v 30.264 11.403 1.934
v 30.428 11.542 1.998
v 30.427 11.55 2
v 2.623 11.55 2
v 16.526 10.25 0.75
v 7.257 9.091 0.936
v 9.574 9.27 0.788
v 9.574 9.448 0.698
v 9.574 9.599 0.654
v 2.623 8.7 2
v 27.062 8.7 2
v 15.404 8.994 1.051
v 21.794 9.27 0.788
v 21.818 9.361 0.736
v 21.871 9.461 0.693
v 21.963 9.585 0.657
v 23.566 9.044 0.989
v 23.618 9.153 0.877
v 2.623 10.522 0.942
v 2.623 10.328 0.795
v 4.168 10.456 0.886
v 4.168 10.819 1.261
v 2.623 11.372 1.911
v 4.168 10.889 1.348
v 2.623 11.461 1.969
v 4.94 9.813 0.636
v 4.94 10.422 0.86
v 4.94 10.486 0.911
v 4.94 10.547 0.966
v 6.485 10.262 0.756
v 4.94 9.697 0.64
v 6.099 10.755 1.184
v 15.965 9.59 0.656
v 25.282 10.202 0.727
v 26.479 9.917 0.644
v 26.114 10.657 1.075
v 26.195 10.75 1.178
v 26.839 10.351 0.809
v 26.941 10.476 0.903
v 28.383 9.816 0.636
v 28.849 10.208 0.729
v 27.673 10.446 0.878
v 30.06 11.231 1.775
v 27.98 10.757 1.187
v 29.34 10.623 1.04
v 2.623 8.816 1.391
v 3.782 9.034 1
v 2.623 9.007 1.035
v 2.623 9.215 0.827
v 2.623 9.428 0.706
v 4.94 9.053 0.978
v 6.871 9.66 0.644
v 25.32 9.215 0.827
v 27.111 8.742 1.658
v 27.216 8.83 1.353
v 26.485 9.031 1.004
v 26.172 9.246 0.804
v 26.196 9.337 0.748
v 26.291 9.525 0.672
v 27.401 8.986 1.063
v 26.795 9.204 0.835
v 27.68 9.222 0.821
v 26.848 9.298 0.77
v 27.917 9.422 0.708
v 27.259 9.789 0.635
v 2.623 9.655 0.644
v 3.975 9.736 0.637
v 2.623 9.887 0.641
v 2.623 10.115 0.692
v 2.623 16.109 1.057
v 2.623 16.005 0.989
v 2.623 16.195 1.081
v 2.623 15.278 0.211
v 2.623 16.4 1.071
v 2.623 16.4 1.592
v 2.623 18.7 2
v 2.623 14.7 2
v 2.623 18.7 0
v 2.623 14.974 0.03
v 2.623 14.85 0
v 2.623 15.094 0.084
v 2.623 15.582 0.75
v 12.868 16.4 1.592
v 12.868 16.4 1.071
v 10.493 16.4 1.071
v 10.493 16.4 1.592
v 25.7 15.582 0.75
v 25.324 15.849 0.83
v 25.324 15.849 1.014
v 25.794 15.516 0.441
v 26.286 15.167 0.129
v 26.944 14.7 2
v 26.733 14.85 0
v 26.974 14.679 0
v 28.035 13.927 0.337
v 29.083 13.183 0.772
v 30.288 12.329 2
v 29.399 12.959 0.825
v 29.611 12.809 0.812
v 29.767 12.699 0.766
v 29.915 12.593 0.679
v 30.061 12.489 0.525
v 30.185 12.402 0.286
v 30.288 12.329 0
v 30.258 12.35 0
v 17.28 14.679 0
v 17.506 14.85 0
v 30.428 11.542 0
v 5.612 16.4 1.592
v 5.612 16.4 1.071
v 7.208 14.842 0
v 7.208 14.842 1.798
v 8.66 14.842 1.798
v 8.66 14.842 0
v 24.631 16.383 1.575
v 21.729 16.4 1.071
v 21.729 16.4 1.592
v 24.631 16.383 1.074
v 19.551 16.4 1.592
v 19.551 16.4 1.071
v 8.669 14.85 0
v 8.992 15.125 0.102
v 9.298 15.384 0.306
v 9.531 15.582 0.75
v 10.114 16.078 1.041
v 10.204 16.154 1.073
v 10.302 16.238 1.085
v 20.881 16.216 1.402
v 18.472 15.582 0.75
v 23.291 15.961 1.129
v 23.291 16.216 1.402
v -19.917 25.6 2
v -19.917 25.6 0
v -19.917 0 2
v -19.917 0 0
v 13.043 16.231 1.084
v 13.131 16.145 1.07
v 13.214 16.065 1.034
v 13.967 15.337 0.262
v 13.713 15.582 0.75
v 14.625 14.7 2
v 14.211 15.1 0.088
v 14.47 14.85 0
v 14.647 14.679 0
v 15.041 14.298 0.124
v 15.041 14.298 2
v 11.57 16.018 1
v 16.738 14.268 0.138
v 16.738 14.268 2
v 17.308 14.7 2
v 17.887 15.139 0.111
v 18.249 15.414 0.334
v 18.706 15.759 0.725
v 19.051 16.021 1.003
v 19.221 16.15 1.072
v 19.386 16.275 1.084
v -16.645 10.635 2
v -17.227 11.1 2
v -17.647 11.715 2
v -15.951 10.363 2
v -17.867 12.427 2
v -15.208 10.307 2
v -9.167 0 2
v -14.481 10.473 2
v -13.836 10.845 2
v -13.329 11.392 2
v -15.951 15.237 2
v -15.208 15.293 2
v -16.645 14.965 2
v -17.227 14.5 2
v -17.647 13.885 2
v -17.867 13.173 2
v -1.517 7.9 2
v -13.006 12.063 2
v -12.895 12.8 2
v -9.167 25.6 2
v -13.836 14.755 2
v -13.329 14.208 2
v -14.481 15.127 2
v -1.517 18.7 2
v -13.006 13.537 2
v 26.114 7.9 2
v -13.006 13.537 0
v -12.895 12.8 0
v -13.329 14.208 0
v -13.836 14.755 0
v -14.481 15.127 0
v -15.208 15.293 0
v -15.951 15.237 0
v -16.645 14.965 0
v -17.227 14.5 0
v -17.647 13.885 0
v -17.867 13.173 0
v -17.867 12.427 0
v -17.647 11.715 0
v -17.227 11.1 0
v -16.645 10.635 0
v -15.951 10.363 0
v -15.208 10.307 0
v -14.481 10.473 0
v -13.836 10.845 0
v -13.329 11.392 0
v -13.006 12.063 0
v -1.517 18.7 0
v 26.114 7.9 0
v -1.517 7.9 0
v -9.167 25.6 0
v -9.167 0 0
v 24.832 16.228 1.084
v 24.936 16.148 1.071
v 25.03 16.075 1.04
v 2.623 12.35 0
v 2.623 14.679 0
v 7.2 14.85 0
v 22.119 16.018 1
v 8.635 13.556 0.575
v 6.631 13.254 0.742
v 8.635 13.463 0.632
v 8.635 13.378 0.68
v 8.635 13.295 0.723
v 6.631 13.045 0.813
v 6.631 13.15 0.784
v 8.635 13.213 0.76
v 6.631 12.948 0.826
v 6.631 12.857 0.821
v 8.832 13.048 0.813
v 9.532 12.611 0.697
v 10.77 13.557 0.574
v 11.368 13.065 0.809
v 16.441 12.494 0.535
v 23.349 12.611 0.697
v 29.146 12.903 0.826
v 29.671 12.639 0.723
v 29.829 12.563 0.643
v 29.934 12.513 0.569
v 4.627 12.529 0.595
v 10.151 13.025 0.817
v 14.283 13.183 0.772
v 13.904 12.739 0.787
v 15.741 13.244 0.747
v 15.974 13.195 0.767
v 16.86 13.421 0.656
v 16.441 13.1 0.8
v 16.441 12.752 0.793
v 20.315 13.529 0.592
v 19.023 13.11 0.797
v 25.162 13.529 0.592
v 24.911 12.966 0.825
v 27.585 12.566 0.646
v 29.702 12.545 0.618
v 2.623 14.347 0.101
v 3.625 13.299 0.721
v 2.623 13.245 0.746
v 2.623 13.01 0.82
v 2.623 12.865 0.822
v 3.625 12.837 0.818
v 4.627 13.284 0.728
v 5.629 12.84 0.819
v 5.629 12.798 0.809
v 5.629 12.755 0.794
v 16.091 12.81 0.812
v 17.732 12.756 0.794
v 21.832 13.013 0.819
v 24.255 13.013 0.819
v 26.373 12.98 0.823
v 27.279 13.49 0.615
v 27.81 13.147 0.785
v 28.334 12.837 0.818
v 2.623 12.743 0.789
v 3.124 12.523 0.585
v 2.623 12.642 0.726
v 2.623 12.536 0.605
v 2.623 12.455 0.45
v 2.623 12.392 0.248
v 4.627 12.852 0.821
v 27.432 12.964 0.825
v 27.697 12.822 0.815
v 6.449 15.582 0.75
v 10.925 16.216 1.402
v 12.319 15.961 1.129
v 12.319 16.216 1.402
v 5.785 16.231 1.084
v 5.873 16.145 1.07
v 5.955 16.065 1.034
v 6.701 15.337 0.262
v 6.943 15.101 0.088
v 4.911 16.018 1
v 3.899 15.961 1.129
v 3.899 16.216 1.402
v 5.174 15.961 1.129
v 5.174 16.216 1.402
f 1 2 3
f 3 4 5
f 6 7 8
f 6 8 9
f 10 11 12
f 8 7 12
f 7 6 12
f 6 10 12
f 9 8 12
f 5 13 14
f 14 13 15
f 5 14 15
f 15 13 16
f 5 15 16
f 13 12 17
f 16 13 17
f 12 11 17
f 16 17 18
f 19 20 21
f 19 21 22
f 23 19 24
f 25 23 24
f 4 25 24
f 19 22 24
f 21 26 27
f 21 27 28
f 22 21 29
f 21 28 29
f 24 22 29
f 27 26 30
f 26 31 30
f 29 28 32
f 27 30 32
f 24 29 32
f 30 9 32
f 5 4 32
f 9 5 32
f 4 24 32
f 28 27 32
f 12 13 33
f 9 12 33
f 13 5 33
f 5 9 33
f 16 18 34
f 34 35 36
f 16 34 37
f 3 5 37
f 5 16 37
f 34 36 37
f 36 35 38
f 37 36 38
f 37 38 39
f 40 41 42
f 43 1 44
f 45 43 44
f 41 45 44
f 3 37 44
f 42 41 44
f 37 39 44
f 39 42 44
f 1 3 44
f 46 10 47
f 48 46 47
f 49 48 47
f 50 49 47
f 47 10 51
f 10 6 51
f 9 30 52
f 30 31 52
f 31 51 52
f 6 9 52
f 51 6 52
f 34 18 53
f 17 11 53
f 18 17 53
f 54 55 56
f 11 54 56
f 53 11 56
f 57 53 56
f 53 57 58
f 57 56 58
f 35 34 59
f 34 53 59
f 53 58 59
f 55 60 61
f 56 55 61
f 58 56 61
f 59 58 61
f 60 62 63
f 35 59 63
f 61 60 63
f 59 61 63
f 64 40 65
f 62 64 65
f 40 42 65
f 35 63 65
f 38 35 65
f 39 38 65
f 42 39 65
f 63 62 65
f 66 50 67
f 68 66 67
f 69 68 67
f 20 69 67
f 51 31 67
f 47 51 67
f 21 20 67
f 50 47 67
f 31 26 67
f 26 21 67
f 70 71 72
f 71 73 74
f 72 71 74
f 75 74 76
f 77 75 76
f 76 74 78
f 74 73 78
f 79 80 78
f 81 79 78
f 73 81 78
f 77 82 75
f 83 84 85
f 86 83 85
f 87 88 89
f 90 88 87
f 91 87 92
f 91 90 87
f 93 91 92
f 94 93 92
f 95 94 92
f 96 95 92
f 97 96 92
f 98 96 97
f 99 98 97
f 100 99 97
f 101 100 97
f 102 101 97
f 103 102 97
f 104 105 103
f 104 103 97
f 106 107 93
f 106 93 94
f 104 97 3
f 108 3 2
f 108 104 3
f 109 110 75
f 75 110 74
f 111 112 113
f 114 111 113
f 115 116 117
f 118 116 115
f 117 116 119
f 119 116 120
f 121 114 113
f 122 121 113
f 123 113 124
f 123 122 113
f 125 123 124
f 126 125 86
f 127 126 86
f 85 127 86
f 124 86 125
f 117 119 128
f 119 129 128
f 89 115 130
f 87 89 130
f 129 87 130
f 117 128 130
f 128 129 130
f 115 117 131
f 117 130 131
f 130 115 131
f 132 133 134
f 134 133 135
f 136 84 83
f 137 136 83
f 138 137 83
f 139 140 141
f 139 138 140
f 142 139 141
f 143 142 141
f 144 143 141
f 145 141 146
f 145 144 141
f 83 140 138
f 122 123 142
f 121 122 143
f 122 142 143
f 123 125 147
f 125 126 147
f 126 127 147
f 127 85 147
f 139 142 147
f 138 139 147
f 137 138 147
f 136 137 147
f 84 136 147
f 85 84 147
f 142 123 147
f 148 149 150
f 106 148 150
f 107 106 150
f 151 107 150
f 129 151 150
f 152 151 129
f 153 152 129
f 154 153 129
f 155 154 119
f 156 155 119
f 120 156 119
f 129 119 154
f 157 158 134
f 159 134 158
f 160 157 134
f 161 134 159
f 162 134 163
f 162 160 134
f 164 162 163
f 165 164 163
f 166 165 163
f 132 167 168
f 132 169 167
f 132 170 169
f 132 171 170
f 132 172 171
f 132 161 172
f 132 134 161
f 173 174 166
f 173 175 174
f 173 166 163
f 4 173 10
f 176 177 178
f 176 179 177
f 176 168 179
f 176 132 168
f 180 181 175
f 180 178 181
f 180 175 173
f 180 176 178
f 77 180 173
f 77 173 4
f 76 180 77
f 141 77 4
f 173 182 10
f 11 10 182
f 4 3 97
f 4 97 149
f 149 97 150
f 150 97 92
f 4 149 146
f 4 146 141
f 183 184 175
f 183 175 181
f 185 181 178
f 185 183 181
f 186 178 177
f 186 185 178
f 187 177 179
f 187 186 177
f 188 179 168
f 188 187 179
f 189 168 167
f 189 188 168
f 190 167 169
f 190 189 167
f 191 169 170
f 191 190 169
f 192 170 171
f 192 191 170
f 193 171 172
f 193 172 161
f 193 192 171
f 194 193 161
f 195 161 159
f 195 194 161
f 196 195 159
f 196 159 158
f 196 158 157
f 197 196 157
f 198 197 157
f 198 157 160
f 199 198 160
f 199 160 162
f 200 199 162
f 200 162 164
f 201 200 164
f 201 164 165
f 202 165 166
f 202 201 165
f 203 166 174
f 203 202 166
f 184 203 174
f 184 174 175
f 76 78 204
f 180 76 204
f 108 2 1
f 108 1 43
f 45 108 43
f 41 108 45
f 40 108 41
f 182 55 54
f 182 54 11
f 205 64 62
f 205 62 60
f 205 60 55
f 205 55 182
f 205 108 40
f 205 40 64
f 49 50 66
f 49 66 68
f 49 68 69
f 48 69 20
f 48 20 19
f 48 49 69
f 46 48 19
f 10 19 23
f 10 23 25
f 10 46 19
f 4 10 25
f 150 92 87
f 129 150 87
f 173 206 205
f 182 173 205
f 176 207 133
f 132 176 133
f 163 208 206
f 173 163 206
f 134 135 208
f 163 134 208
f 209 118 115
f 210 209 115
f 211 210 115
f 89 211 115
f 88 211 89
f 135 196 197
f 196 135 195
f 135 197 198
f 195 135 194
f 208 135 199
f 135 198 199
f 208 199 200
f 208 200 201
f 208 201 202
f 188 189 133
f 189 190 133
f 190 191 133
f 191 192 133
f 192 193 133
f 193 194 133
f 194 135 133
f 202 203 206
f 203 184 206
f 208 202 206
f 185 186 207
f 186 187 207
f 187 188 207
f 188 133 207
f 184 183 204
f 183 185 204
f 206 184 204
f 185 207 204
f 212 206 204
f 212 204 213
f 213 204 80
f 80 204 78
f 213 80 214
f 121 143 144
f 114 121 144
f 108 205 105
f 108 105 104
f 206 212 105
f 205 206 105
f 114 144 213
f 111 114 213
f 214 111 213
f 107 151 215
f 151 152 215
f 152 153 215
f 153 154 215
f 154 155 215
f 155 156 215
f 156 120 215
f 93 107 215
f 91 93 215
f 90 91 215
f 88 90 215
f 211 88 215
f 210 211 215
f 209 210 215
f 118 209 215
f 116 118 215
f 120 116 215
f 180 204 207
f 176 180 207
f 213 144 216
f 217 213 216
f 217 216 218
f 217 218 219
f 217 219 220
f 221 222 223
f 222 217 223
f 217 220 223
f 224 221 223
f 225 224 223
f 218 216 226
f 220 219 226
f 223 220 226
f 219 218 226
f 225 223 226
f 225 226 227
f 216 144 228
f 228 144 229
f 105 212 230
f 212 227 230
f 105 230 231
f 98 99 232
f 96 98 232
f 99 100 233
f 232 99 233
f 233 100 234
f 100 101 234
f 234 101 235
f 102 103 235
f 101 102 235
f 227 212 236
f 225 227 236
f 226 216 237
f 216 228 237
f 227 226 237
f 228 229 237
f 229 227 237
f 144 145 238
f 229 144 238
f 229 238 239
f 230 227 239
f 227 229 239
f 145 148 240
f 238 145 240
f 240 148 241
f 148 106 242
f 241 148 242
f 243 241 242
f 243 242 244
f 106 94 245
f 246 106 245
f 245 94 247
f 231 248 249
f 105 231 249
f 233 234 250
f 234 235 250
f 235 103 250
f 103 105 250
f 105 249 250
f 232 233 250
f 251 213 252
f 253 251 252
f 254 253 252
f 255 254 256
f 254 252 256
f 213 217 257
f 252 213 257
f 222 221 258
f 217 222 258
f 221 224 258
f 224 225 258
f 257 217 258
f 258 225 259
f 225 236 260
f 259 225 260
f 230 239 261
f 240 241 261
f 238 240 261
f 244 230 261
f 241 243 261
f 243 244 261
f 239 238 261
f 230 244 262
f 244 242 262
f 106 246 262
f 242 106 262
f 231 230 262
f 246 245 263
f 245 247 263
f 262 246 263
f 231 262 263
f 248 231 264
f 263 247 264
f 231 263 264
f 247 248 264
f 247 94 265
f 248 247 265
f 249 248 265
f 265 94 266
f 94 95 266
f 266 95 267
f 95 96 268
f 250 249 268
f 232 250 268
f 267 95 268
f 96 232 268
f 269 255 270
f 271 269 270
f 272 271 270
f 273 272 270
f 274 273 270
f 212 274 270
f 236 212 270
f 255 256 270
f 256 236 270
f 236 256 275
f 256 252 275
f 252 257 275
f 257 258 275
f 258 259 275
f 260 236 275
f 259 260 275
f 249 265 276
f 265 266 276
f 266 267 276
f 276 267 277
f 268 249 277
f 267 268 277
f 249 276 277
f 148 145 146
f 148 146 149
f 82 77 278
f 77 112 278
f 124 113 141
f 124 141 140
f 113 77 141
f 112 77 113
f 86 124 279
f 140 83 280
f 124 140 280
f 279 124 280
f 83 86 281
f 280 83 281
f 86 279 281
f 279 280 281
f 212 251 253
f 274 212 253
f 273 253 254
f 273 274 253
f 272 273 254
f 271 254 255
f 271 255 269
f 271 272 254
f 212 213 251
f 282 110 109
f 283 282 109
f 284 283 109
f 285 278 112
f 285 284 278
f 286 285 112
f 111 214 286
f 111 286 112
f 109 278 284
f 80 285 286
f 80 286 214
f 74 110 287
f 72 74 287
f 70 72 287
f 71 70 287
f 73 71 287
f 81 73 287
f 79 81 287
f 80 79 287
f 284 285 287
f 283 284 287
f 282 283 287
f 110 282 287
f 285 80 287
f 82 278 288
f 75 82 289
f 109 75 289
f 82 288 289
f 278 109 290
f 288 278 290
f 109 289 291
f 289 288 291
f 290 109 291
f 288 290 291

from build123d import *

# Parameters (mm, degrees)
F0_R      = 2.5
F1_DEPTH  = 2
F12_DEPTH = 2.0010001


with BuildPart() as f1:
    # F0 (on Top) → F1 (new body)
    with BuildSketch(Plane.XY):
        Polygon((-9.1669032276, 25.6), (-19.9169032276, 25.6), (-19.9169032276, 0), (-9.1669032276, 0), (-1.5169032276, 7.9), (30.5230967724, 7.9), (30.5230967724, 16.4), (2.6230967724, 16.4), (2.6230967724, 18.7), (-1.5169032276, 18.7), align=None)
        with Locations((-15.3946050969, 12.8)):
            Circle(F0_R, mode=Mode.SUBTRACT)
    extrude(amount=F1_DEPTH)

    # F4: sweep along a path in F2
    with BuildLine(Plane.XY.offset(2)) as f4_path:
        Line((2.6230967724, 15.15), (30.5230967724, 15.15))
    # F3 (on face) → F4 (sweep, cut)
    with BuildSketch(Plane.YZ.offset(2.6230967724)):
        with BuildLine():
            Line((17.3, 2), (15.3, 2))
            Line((15.3, 2), (14.7, 2))
            Line((14.7, 2), (15.5823529412, 0.75))
            add(Edge.make_bspline(
                [(15.5823529412, 0.75), (16.5972711165, 1.727867192), (16.3149181753, 1.727867192), (17.3, 2)],
                knots=[0, 0, 0, 0, 2.1243378777, 2.1243378777, 2.1243378777, 2.1243378777], degree=3))
        make_face()
    sweep(path=f4_path.line, mode=Mode.SUBTRACT)

    # F7: sweep along a path in F5
    with BuildLine(Plane.XY.offset(2)) as f7_path:
        Line((2.6230967724, 10.25), (30.5230967724, 10.25))
    # F6 (on face) → F7 (sweep, cut)
    with BuildSketch(Plane.YZ.offset(2.6230967724)):
        with BuildLine():
            add(Edge.make_bspline(
                [(11.55, 2), (11.1790336668, 1.9353309371), (10.4687979638, 0.1254777743), (8.7644318119, 0.7537172832), (8.7, 2)],
                knots=[0, 0, 0, 0, 0.4876224091, 1, 1, 1, 1], degree=3))
            Line((11.55, 2), (8.7, 2))
        make_face()
    sweep(path=f7_path.line, mode=Mode.SUBTRACT)

    # F10: sweep along a path in F8
    with BuildLine(Plane(origin=(0, 0, 0), x_dir=(1, 0, 0), z_dir=(0, 0, -1))) as f10_path:
        Line((2.6230967724, -17.2), (30.5230967724, -17.2))
    # F9 (on face) → F10 (sweep, cut)
    with BuildSketch(Plane.YZ.offset(2.6230967724)):
        with BuildLine():
            Line((17.2, 0), (17.2, 1))
            add(Edge.make_bspline(
                [(17.2, 1), (16.4, 1), (16.0935369316, 1.4085311701), (15.3480378536, 0.0682215952), (14.85, 0)],
                knots=[0, 0, 0, 0, 0.2283467357, 0.4887534963, 0.4887534963, 0.4887534963, 0.4887534963], degree=3))
            Line((14.85, 0), (17.2, 0))
        make_face()
        with BuildLine():
            Line((12.35, 0), (14.6790269663, 0))
            add(Edge.make_bspline(
                [(14.6790269663, 0), (14.1576409549, 0.0644703918), (13.0556896692, 1.1783434405), (12.4299004674, 0.6828821497), (12.35, 0)],
                knots=[0.5179423028, 0.5179423028, 0.5179423028, 0.5179423028, 0.7800763138, 1, 1, 1, 1], degree=3))
        make_face()
        with BuildLine():
            add(Edge.make_bspline(
                [(14.85, 0), (14.7941752951, -0.0076469096), (14.7370836655, -0.0071788235), (14.6790269663, 0)],
                knots=[0.4887534963, 0.4887534963, 0.4887534963, 0.4887534963, 0.5179423028, 0.5179423028, 0.5179423028, 0.5179423028], degree=3))
            Line((14.85, 0), (14.6790269663, 0))
        make_face()
    sweep(path=f10_path.line, mode=Mode.SUBTRACT)

    # F11 (on Top) → F12 (cut, through all)
    with BuildSketch(Plane.XY):
        Polygon((39.7434785501, 18.7), (2.6230967724, 18.7), (2.6230967724, 16.7), (5.3041512147, 16.7), (7.2075817734, 14.8422960192), (8.660200052, 14.8422960192), (10.6638120487, 16.5453646332), (12.7175133675, 16.5453646332), (15.0406220928, 14.2980599776), (16.7383030057, 14.2682762817), (19.5677690208, 16.4127144963), (24.6310271323, 16.3829308003), (25.3239014027, 15.8490902482), (30.2877575159, 12.3288799077), (30.4283164442, 11.5417372435), (25.4341885448, 7.3262052611), (39.7434785501, 7.5555583894), (39.7434785501, 11.2498085946), align=None)
    extrude(amount=F12_DEPTH, mode=Mode.SUBTRACT)


solid = f1.part
